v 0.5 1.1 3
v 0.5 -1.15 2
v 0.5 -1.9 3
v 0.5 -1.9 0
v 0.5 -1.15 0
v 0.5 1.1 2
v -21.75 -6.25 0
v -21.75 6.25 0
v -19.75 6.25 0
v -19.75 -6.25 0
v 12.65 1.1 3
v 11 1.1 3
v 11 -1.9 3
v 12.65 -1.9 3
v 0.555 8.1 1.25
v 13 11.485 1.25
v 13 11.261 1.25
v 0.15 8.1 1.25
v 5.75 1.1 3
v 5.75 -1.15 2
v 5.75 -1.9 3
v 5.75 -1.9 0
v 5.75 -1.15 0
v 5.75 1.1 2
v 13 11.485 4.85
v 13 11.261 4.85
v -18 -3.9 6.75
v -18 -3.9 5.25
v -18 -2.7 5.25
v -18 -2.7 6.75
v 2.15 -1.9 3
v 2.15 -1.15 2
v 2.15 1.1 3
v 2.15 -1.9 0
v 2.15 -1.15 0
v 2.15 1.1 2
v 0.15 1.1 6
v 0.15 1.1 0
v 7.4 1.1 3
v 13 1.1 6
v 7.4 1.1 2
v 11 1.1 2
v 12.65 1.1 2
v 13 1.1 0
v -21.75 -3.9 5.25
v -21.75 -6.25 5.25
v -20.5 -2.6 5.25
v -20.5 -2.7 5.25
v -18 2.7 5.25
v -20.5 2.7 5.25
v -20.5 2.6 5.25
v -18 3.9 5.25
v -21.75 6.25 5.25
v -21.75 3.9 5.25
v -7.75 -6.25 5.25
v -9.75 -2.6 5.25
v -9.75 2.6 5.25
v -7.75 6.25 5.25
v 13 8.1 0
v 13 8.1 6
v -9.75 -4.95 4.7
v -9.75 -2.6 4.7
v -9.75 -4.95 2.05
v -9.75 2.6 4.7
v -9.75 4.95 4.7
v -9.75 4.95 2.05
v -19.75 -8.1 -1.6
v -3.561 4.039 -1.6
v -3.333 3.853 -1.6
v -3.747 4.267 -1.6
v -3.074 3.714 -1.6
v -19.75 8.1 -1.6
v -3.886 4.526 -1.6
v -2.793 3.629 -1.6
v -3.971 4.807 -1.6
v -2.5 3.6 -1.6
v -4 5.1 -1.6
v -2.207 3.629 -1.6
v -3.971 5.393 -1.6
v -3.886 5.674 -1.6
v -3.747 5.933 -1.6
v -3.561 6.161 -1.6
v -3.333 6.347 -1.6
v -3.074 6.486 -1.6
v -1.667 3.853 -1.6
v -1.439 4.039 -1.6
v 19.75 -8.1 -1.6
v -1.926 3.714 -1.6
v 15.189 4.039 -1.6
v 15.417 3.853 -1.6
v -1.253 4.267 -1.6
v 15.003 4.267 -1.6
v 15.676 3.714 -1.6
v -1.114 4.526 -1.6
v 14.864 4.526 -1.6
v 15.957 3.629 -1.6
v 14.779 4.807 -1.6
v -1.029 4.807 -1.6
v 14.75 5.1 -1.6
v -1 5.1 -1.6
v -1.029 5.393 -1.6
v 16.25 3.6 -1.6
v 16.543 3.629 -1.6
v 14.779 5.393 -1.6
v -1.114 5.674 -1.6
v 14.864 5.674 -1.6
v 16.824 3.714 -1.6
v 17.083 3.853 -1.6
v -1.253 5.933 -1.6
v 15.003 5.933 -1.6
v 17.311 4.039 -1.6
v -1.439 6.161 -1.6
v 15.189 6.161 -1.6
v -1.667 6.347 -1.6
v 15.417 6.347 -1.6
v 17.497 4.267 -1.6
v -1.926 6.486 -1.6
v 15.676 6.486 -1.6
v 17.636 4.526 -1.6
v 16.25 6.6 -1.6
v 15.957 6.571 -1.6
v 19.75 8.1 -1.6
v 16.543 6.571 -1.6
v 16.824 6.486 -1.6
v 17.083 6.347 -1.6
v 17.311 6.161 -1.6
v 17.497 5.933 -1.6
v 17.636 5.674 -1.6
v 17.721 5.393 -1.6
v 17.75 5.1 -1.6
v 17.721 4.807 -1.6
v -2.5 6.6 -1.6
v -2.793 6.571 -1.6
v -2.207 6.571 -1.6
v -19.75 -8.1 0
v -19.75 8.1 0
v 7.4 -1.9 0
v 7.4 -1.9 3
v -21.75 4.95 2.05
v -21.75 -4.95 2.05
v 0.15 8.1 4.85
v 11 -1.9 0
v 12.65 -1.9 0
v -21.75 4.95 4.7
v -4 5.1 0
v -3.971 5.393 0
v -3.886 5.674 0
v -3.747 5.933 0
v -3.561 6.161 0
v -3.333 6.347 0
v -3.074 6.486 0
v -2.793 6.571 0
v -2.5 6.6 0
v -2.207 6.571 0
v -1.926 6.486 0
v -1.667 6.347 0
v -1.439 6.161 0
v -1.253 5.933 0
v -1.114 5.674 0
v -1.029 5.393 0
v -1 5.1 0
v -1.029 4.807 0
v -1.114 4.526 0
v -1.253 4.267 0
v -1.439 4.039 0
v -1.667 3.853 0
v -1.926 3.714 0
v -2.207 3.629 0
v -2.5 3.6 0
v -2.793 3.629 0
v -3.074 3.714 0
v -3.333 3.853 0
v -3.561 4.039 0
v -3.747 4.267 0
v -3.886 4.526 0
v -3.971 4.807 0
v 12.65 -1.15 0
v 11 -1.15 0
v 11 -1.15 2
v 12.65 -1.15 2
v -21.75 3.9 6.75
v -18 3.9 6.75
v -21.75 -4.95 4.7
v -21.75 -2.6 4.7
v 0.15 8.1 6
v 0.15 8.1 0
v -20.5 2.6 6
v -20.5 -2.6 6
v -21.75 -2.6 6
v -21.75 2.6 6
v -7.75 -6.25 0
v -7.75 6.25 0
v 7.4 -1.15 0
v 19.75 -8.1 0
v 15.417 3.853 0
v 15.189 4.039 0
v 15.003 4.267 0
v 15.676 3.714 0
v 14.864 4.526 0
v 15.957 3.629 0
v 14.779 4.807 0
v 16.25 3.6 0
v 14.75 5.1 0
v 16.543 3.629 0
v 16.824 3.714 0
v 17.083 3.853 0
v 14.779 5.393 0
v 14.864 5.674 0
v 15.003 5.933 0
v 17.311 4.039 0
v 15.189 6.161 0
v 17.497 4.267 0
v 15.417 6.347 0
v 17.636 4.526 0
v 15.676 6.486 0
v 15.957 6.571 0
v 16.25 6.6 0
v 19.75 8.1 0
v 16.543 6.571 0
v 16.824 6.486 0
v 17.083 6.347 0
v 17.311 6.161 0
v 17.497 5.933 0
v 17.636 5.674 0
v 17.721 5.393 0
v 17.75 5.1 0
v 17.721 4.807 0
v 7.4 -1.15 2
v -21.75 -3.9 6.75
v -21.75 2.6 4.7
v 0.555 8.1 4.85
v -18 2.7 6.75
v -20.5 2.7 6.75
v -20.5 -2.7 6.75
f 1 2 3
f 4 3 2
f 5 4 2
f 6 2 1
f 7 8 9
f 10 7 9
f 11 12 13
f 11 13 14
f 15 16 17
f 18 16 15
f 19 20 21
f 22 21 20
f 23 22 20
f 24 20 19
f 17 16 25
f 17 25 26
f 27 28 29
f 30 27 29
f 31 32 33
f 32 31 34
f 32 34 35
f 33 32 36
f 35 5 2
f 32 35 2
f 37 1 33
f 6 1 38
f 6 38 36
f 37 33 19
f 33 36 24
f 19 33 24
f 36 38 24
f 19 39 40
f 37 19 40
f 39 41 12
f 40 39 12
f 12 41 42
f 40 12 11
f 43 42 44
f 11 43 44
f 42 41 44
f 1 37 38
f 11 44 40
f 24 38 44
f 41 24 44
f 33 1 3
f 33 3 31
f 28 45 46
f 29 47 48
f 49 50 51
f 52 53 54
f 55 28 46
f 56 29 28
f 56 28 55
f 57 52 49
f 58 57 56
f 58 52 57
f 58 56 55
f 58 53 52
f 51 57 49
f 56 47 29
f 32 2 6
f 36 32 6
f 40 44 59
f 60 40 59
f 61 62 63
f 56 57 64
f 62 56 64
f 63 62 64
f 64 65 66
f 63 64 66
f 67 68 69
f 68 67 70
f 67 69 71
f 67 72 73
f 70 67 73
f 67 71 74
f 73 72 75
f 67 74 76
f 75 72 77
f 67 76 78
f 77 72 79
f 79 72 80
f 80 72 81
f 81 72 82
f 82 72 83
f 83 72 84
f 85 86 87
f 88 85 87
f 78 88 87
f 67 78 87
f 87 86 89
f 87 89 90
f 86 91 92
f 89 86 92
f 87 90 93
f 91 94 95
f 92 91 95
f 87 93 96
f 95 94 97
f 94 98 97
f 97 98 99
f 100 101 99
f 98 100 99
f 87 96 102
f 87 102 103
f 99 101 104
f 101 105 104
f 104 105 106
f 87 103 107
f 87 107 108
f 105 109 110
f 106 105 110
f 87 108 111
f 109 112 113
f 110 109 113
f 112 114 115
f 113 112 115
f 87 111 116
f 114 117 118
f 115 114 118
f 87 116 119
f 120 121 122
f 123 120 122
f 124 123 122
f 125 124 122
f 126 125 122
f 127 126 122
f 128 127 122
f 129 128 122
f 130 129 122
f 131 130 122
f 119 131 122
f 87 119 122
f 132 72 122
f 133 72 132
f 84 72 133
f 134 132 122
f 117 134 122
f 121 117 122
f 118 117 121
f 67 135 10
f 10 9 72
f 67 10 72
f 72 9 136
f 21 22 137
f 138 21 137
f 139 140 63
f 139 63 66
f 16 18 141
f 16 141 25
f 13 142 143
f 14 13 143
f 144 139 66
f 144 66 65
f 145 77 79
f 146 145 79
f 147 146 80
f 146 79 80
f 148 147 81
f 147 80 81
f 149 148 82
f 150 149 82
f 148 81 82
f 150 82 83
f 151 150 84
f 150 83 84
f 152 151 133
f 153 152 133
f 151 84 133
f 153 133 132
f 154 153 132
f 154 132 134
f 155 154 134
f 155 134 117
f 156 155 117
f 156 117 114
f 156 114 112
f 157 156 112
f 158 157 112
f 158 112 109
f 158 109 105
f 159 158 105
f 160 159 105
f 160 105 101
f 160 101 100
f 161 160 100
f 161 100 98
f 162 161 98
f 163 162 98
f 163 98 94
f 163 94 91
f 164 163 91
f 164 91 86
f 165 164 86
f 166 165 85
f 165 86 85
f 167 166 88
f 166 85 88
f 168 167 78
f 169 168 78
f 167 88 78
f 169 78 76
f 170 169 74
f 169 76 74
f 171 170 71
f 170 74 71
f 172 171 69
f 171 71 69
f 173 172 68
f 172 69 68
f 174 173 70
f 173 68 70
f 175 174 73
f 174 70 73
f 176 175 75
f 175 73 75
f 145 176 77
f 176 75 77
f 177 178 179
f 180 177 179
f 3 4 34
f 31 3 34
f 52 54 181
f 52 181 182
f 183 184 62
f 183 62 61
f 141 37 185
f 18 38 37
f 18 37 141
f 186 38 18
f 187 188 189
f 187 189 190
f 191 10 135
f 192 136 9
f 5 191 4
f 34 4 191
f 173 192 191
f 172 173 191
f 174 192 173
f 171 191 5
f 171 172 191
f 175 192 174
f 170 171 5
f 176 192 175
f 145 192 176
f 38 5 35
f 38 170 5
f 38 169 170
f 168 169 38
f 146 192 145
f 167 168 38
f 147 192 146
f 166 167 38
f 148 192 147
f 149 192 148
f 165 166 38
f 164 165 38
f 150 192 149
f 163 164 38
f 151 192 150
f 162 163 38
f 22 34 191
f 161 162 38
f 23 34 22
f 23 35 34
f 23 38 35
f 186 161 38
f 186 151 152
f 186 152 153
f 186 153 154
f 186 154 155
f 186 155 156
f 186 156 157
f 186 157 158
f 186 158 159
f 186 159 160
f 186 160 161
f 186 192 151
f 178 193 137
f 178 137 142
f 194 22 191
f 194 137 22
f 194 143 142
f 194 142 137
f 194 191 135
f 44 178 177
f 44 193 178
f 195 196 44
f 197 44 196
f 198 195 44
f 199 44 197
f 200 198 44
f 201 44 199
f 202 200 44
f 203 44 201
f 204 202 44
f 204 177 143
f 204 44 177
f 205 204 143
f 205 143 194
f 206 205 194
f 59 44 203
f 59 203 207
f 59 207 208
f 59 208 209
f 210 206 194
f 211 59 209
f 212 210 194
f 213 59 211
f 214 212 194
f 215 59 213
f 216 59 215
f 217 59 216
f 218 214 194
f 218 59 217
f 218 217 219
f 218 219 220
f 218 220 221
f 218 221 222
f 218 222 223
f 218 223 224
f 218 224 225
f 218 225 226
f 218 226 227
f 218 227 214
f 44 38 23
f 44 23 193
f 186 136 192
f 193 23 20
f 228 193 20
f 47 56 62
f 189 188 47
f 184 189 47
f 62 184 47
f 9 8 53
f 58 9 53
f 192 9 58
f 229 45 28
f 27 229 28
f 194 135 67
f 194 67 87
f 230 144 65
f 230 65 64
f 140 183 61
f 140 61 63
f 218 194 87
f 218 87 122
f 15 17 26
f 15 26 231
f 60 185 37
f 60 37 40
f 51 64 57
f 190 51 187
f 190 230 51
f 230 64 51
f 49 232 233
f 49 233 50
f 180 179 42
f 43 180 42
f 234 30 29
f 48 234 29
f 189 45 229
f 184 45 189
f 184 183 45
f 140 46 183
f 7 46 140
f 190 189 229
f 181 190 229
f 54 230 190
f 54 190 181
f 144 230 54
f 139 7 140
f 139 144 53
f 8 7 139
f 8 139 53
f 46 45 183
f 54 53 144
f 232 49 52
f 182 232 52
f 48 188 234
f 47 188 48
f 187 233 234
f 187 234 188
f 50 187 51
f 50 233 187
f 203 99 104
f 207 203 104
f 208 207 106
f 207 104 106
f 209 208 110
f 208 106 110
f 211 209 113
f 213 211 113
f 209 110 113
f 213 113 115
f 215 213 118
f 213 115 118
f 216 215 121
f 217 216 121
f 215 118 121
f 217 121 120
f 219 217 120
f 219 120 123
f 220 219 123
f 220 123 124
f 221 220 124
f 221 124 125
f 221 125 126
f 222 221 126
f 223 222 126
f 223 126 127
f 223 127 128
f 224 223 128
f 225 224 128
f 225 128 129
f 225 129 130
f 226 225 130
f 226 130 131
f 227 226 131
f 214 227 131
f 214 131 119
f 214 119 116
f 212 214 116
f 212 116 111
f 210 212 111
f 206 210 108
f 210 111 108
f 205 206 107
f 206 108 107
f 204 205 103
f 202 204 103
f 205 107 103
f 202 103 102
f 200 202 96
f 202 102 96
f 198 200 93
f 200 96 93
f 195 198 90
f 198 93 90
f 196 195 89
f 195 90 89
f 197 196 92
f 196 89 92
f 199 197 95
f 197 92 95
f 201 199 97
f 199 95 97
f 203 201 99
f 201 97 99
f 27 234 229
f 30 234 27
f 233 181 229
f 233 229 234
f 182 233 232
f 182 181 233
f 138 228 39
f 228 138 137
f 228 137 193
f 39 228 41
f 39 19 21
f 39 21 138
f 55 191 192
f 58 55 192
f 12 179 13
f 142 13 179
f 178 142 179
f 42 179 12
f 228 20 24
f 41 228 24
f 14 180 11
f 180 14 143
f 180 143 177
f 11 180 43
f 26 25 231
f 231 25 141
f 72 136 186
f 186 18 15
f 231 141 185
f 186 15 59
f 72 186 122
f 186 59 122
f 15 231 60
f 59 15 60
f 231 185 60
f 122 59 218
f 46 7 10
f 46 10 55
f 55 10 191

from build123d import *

# Parameters (mm, degrees)
SKETCH1_W                = 39.5
SKETCH1_H                = 16.2
BOSS_EXTRUDE1_DEPTH      = 1.6
F_3_0_3_DIAMETER_HOLE1_D = 3
SKETCH4_W                = 12.85
SKETCH4_H                = 7
BOSS_EXTRUDE2_DEPTH      = 6
SKETCH5_W                = 14
SKETCH5_H                = 12.5
BOSS_EXTRUDE3_DEPTH      = 5.25
SKETCH6_W                = 3.75
SKETCH6_H                = 7.8
BOSS_EXTRUDE4_DEPTH      = 1.5
SKETCH7_W                = 1.65
SKETCH7_H                = 3
BOSS_EXTRUDE5_DEPTH      = 3
BOSS_EXTRUDE6_START      = -1.25
BOSS_EXTRUDE6_DEPTH      = 3.6
SKETCH13_W               = 2
SKETCH13_H               = 2.25
CUT_EXTRUDE5_DEPTH       = 26.933403936
SKETCH10_W               = 1.5
SKETCH10_H               = 5.4
CUT_EXTRUDE2_DEPTH       = 2.5
SKETCH11_W               = 0.75
SKETCH11_H               = 5.2
CUT_EXTRUDE3_DEPTH       = 43.39742256
CUT_EXTRUDE4_DEPTH       = 12


with BuildPart() as part:
    # Sketch1 → Boss-Extrude1 (new body)
    with BuildSketch(Plane.XY):
        Rectangle(SKETCH1_W, SKETCH1_H)
    extrude(amount=-BOSS_EXTRUDE1_DEPTH)

    # Ø3.0 (3) Diameter Hole1 (through all)
    with Locations(Plane.XY):
        with Locations((-2.5, 5.1), (16.25, 5.1)):
            Hole(F_3_0_3_DIAMETER_HOLE1_D / 2)

    # Sketch4 → Boss-Extrude2 (add)
    with BuildSketch(Plane.XY):
        with Locations((6.575, 4.6)):
            Rectangle(SKETCH4_W, SKETCH4_H)
    extrude(amount=BOSS_EXTRUDE2_DEPTH)

    # Sketch5 → Boss-Extrude3 (add)
    with BuildSketch(Plane.XY):
        with Locations((-14.75, 0)):
            Rectangle(SKETCH5_W, SKETCH5_H)
    extrude(amount=BOSS_EXTRUDE3_DEPTH)

    # Sketch6 → Boss-Extrude4 (add)
    with BuildSketch(Plane.XY.offset(5.25)):
        with Locations((-19.875, 0)):
            Rectangle(SKETCH6_W, SKETCH6_H)
    extrude(amount=BOSS_EXTRUDE4_DEPTH)

    # Sketch7 → Boss-Extrude5 (add)
    with BuildSketch(Plane.XY):
        with Locations((11.825, -0.4)):
            Rectangle(SKETCH7_W, SKETCH7_H)
        with Locations((6.575, -0.4)):
            Rectangle(SKETCH7_W, SKETCH7_H)
        with Locations((1.325, -0.4)):
            Rectangle(SKETCH7_W, SKETCH7_H)
    extrude(amount=BOSS_EXTRUDE5_DEPTH)

    # Sketch8 → Boss-Extrude6 (add)
    with BuildSketch(Plane(origin=(0, 0, 0), x_dir=(-1, 0, 0), z_dir=(0, 0, -1)).offset(BOSS_EXTRUDE6_START)):
        Polygon((-13, 11.261122396), (-0.555210526, 8.1), (-0.15, 8.1), (-13, 11.485488222), align=None)
    extrude(amount=-BOSS_EXTRUDE6_DEPTH)

    # Sketch13 → Cut-Extrude5 (cut, through all)
    with BuildSketch(Plane.ZY.offset(-0.5)):
        with Locations((1, -0.025)):
            Rectangle(SKETCH13_W, SKETCH13_H)
    extrude(amount=-CUT_EXTRUDE5_DEPTH, mode=Mode.SUBTRACT)

    # Sketch10 → Cut-Extrude2 (cut)
    with BuildSketch(Plane(origin=(-18, 0, 0), x_dir=(0, 0, -1), z_dir=(1, 0, 0))):
        with Locations((-6, 0)):
            Rectangle(SKETCH10_W, SKETCH10_H)
    extrude(amount=-CUT_EXTRUDE2_DEPTH, mode=Mode.SUBTRACT)

    # Sketch11 → Cut-Extrude3 (cut, through all)
    with BuildSketch(Plane(origin=(-20.5, 0, 0), x_dir=(0, 0, -1), z_dir=(1, 0, 0))):
        with Locations((-5.625, 0)):
            Rectangle(SKETCH11_W, SKETCH11_H)
    extrude(amount=-CUT_EXTRUDE3_DEPTH, mode=Mode.SUBTRACT)

    # Sketch12 → Cut-Extrude4 (cut)
    with BuildSketch(Plane(origin=(-21.75, 0, 0), x_dir=(0, 0, -1), z_dir=(1, 0, 0))):
        Polygon((-6, -2.6), (-4.7, -2.6), (-4.7, -4.95), (-2.05, -4.95), (-2.05, 4.95), (-4.7, 4.95), (-4.7, 2.6), (-6, 2.6), align=None)
    extrude(amount=CUT_EXTRUDE4_DEPTH, mode=Mode.SUBTRACT)


solid = part.part
